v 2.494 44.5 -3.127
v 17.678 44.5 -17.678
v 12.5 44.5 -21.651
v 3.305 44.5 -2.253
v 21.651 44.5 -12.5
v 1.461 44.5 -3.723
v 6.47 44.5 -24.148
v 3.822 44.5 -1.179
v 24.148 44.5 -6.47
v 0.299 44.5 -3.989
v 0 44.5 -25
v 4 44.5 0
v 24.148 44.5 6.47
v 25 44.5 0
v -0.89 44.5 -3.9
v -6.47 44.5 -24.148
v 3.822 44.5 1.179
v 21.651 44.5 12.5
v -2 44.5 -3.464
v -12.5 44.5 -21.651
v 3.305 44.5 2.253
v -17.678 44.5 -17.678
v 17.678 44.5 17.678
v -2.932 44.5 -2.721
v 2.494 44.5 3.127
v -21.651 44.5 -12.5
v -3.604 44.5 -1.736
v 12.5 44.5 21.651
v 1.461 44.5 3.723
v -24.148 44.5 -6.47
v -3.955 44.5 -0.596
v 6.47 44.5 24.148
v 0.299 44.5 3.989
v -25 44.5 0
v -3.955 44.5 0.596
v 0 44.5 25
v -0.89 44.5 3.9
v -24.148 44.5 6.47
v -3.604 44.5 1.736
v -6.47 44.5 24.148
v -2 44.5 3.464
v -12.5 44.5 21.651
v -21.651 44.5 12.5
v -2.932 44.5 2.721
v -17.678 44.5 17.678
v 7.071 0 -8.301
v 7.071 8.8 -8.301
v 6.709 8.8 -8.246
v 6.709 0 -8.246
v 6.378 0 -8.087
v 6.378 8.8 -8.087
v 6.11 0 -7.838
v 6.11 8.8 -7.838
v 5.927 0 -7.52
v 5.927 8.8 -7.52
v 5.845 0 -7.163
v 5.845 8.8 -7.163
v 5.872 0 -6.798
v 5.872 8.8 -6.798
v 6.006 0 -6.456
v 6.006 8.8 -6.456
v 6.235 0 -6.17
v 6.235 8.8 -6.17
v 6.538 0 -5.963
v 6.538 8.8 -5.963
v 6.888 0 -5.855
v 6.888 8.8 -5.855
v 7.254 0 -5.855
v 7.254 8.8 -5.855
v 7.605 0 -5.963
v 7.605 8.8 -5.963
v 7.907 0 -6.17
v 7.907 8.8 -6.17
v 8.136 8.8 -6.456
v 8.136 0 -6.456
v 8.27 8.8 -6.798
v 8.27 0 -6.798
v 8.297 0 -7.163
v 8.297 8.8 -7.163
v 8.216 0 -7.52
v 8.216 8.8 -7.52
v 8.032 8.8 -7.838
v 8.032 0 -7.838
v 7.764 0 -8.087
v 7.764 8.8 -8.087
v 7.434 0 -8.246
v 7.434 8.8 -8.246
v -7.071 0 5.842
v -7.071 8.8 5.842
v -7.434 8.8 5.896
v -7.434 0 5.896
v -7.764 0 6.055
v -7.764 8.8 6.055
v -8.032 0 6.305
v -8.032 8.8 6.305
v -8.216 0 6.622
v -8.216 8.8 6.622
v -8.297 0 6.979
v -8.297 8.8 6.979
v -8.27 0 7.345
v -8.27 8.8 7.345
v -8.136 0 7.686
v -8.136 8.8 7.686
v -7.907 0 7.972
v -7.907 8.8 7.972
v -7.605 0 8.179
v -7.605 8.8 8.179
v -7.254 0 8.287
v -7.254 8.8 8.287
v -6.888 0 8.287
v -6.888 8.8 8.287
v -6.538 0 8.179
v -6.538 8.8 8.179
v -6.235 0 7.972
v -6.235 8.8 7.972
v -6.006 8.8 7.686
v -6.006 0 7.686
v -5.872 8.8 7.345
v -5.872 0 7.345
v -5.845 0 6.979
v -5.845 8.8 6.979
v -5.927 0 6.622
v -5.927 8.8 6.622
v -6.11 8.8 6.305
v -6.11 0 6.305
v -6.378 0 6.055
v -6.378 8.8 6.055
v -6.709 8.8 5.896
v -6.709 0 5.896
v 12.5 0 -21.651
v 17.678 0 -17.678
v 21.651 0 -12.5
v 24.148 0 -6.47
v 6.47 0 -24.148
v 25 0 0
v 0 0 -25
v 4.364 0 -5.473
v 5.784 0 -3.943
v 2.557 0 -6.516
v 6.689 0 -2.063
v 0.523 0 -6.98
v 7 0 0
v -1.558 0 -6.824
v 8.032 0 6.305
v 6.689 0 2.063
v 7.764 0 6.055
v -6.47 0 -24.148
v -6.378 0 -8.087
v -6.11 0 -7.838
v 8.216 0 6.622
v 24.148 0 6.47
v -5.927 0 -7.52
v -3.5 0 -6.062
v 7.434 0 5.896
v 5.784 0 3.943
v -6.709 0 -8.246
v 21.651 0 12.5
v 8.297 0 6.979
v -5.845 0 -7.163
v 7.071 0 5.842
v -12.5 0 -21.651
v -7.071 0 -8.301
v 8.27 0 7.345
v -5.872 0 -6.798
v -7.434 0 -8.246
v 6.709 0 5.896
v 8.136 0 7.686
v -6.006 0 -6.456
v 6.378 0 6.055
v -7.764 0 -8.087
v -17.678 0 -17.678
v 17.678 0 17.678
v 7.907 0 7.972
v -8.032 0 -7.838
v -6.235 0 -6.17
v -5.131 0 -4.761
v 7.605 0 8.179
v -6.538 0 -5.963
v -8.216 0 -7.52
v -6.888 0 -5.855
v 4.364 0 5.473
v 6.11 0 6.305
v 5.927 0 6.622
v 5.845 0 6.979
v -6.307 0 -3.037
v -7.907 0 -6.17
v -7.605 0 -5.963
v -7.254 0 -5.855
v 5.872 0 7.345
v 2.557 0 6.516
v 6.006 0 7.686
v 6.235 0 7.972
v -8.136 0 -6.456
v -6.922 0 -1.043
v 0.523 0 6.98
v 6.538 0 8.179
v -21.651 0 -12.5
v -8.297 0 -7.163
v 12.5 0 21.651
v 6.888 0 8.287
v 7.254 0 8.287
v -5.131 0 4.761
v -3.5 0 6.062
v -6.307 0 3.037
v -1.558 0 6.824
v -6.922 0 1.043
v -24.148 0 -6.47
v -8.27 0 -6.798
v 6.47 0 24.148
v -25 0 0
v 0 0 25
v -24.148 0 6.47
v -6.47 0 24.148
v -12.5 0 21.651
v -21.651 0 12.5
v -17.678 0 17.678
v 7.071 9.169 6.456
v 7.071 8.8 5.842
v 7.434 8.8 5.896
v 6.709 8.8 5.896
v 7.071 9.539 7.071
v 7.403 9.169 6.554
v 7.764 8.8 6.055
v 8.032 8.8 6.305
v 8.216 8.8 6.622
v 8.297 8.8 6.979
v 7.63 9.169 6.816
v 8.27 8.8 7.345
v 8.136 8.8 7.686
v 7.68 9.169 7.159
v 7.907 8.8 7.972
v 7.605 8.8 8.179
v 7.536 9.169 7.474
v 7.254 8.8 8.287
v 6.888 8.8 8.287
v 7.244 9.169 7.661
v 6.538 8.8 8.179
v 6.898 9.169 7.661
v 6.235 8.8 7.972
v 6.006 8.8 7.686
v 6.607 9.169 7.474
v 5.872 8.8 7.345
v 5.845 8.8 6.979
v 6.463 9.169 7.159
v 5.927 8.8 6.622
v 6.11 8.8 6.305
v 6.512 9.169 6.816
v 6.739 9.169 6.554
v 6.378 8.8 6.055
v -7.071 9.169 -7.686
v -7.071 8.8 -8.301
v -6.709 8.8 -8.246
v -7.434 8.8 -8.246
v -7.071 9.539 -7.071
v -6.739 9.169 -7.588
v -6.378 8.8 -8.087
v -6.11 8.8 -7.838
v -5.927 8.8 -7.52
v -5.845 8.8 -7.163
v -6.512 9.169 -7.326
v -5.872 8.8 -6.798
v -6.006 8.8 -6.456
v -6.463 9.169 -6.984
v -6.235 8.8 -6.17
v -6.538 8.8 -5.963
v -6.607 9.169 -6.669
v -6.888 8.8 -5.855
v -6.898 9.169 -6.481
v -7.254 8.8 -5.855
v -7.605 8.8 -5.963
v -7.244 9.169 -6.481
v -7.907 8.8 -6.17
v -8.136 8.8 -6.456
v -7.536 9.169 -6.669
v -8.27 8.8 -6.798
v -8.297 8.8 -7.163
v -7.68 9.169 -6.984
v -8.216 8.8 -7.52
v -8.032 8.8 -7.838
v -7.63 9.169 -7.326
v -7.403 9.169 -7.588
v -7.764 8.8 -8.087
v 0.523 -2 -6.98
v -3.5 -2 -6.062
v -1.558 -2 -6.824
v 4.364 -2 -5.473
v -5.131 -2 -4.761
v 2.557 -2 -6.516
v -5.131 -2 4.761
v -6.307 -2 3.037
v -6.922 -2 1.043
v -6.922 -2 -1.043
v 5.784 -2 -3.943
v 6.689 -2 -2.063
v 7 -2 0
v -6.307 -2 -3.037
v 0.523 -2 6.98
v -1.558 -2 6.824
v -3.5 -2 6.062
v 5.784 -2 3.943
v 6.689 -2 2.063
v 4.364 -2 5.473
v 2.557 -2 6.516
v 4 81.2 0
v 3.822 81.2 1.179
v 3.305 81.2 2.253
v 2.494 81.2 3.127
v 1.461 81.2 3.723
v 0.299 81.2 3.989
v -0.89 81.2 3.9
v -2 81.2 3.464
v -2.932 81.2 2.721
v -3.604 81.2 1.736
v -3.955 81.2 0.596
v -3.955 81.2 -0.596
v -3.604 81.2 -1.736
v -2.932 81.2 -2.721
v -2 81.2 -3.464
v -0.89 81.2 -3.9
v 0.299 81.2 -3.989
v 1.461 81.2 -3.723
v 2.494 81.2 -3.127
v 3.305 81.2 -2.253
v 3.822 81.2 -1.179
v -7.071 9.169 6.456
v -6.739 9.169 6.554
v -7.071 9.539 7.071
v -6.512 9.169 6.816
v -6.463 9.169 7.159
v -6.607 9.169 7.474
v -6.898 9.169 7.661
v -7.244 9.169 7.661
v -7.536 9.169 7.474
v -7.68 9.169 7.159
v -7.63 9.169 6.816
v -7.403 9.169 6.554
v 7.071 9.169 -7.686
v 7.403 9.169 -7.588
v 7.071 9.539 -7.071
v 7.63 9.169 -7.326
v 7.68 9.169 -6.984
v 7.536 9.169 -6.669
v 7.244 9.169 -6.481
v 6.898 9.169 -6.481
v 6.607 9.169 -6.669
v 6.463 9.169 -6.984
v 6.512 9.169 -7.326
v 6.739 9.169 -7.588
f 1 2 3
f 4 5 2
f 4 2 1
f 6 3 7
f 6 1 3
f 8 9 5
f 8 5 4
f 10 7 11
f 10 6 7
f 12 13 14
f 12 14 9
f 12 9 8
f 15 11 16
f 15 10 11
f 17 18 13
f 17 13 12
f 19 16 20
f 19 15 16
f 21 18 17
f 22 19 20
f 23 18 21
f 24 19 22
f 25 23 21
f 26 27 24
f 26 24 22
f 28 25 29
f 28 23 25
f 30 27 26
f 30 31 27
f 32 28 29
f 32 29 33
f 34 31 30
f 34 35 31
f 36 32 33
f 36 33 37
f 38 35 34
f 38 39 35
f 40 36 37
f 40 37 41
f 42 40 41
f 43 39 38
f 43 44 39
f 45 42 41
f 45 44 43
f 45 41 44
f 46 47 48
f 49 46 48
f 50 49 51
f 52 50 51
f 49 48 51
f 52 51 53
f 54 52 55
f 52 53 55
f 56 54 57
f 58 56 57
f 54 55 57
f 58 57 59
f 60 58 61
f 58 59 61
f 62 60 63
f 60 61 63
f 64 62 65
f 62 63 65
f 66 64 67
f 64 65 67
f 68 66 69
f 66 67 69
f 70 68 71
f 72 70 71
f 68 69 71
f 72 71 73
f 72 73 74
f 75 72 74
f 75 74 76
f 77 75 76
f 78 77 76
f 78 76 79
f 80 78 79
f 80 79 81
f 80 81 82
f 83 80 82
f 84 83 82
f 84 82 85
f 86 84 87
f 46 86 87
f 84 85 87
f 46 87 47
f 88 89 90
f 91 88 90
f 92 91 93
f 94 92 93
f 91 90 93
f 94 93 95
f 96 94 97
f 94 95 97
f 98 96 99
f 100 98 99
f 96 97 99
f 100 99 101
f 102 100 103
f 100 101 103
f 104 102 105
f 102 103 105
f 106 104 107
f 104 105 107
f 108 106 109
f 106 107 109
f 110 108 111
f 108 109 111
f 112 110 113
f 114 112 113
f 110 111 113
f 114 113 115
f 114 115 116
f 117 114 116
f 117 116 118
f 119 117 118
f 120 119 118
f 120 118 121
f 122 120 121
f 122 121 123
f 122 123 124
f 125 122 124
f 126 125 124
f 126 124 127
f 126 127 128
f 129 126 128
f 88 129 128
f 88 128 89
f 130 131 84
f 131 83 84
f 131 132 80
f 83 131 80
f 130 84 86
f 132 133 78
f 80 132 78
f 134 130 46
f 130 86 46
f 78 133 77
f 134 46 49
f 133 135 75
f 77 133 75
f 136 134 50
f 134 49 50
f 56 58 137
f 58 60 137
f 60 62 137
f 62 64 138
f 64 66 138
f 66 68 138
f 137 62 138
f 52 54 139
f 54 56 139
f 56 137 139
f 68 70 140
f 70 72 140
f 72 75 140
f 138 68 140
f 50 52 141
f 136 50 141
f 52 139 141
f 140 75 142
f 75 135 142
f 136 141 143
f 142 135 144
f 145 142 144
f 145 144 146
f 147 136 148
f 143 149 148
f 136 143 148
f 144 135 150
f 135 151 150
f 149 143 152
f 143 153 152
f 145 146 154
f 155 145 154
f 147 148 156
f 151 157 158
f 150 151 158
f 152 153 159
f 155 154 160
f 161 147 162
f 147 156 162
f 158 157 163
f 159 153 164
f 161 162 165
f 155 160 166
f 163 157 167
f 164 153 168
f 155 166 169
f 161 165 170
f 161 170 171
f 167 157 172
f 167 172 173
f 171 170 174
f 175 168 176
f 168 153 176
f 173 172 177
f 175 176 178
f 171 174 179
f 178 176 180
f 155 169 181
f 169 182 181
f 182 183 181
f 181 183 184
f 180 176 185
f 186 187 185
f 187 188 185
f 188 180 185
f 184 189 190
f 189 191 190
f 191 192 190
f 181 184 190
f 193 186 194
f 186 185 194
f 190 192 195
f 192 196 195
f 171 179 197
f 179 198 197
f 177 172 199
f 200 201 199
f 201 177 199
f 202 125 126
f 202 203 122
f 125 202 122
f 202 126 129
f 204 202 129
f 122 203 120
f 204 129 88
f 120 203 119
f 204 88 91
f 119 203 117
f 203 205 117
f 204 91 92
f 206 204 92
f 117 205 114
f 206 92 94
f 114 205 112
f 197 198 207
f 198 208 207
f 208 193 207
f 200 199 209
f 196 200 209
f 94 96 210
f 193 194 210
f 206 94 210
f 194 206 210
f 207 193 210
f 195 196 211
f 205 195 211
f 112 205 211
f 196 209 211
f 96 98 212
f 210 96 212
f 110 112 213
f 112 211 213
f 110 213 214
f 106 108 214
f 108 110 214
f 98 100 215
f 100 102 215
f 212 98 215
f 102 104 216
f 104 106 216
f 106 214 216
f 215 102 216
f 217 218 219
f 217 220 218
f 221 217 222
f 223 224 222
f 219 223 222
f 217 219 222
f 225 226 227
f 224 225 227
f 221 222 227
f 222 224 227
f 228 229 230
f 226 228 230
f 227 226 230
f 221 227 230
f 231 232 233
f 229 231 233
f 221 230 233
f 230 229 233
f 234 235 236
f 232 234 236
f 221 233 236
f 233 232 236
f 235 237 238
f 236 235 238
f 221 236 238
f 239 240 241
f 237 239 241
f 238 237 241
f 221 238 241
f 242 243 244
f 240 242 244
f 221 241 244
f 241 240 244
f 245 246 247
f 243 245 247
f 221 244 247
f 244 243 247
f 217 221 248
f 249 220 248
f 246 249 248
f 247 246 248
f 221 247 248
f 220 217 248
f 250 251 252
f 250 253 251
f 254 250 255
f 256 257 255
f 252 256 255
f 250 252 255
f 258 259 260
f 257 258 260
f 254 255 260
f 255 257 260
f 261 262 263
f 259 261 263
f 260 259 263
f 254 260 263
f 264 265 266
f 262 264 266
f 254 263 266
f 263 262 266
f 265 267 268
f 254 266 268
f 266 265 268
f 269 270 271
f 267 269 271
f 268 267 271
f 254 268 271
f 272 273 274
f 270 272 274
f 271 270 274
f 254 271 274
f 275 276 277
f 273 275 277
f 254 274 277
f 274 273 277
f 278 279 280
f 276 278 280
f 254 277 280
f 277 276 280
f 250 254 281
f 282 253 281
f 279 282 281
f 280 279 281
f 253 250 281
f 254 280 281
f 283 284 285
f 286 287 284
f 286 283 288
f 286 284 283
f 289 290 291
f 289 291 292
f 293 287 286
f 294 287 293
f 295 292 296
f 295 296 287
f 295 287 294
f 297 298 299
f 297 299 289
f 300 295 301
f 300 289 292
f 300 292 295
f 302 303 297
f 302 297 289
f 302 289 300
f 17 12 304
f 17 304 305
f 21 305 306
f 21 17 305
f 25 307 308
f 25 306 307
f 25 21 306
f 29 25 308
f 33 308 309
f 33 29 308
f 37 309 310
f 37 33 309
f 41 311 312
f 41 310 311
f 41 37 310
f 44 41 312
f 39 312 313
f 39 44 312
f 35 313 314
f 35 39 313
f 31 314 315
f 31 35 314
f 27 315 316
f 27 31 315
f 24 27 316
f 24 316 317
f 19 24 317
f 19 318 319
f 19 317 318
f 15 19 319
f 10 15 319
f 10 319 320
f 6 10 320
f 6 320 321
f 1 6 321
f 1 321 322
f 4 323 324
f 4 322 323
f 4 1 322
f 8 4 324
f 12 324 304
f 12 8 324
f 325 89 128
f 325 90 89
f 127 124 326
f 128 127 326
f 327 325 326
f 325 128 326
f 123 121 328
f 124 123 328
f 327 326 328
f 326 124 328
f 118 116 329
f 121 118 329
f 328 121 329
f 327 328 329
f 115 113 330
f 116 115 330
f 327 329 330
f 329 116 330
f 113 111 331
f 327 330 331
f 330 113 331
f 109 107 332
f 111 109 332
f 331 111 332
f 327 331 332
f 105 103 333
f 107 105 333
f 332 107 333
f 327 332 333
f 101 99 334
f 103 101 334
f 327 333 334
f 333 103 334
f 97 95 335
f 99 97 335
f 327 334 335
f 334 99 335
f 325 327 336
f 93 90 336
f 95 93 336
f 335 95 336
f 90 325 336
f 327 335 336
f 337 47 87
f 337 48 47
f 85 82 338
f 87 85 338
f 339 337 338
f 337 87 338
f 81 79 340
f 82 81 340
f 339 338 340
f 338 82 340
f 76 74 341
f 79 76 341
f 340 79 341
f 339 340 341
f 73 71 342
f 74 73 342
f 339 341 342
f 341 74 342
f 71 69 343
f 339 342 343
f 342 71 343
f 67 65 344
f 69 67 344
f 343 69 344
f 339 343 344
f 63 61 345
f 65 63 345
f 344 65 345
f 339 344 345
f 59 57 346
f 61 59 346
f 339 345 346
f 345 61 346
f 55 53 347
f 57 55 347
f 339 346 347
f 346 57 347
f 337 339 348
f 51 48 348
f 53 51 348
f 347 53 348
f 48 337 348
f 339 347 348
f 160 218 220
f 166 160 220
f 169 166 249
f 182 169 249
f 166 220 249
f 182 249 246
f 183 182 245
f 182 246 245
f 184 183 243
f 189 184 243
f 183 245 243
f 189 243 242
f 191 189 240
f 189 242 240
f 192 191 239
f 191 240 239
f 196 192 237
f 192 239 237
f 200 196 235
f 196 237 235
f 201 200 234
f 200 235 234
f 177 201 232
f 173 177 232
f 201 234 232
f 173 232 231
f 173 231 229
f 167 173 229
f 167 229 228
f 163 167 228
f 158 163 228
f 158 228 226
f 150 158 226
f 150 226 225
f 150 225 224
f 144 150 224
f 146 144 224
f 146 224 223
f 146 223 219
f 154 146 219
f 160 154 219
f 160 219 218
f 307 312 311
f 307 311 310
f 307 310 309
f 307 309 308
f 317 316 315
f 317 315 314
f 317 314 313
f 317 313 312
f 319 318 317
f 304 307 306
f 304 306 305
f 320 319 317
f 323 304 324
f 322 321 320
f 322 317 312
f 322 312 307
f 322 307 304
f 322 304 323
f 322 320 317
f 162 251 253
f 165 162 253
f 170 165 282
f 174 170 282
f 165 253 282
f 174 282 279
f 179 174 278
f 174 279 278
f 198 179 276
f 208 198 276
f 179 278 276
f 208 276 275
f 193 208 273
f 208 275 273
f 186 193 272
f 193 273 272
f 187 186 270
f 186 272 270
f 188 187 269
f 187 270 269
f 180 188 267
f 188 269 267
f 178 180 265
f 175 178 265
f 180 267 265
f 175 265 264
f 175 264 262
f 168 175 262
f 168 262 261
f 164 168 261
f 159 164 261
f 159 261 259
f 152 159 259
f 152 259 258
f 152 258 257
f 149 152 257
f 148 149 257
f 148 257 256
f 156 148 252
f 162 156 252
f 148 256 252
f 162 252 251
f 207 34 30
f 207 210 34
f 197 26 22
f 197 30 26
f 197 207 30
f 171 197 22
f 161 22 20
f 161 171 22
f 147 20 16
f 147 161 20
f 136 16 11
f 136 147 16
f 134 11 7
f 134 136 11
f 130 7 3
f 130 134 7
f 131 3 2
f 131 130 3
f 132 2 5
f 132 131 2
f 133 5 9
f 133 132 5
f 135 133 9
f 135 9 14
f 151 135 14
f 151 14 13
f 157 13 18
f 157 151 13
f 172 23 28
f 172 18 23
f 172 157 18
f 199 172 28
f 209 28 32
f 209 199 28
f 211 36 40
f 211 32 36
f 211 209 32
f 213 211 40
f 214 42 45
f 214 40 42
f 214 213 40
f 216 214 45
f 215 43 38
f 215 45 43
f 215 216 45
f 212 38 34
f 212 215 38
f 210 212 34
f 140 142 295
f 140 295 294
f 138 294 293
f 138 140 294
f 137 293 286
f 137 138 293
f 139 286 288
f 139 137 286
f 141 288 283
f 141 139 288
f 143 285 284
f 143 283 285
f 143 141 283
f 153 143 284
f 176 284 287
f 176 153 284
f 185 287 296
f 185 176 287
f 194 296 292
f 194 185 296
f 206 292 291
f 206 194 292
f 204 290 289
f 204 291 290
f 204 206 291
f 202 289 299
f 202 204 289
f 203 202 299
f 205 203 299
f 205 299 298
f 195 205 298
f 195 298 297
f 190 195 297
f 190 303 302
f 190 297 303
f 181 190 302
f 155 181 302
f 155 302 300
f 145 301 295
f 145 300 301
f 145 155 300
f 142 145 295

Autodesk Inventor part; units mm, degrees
ref_plane "YZ Plane" through (0, 0, 0) normal (1, 0, 0) x (0, 1, 0)
ref_plane "XZ Plane" through (0, 0, 0) normal (0, 1, 0) x (-1, 0, 0)
ref_plane "XY Plane" through (0, 0, 0) normal (0, 0, 1) x (1, 0, 0)
sketch "スケッチ7" plane through (0, 0, 0) normal (0, 1, 0) x (-1, 0, 0)
  circle A0 centre (0, 0) radius 25
  dimension "d28" = 50
extrude "押し出し4" add sketch "スケッチ7" along normal blind 44.5
sketch "スケッチ8" plane through (0, 44.5, 0) normal (0, 1, 0) x (1, 0, 0)
  circle A0 centre (0, 0) radius 4
  dimension "d31" = 8
extrude "押し出し5" add sketch "スケッチ8" along normal blind 36.7
sketch "スケッチ9" plane through (0, 0, 0) normal (0, -1, 0) x (1, 0, 0)
  line L0 (0, 0) -> (7.0711, -7.0711)
  line L1 (0, 0) -> (10, 0) construction
  point P0 (7.0711, 7.0711)
  point P1 (-7.0711, 7.0711)
  point P2 (-7.0711, -7.0711)
  dimension "d34" = 10
  dimension "d35" = 45
  dimension "d38" = 360
hole "穴2" at (7.0711, 0, -7.0711) at (7.0711, 0, 7.0711) at (-7.0711, 0, 7.0711) at (-7.0711, 0, -7.0711) direction (0, 1, 0) diameter 2.459 depth 8.8 tip angle 118 thread size "M3x0.5" class "6H" standard "ISO Metric profile"
sketch "スケッチ11" plane through (0, 0, 0) normal (0, -1, 0) x (1, 0, 0)
  circle A0 centre (0, 0) radius 7
  dimension "d52" = 14
extrude "押し出し7" add sketch "スケッチ11" along normal blind 2
properties part number "Rotar" material "アルミニウム 6061"
